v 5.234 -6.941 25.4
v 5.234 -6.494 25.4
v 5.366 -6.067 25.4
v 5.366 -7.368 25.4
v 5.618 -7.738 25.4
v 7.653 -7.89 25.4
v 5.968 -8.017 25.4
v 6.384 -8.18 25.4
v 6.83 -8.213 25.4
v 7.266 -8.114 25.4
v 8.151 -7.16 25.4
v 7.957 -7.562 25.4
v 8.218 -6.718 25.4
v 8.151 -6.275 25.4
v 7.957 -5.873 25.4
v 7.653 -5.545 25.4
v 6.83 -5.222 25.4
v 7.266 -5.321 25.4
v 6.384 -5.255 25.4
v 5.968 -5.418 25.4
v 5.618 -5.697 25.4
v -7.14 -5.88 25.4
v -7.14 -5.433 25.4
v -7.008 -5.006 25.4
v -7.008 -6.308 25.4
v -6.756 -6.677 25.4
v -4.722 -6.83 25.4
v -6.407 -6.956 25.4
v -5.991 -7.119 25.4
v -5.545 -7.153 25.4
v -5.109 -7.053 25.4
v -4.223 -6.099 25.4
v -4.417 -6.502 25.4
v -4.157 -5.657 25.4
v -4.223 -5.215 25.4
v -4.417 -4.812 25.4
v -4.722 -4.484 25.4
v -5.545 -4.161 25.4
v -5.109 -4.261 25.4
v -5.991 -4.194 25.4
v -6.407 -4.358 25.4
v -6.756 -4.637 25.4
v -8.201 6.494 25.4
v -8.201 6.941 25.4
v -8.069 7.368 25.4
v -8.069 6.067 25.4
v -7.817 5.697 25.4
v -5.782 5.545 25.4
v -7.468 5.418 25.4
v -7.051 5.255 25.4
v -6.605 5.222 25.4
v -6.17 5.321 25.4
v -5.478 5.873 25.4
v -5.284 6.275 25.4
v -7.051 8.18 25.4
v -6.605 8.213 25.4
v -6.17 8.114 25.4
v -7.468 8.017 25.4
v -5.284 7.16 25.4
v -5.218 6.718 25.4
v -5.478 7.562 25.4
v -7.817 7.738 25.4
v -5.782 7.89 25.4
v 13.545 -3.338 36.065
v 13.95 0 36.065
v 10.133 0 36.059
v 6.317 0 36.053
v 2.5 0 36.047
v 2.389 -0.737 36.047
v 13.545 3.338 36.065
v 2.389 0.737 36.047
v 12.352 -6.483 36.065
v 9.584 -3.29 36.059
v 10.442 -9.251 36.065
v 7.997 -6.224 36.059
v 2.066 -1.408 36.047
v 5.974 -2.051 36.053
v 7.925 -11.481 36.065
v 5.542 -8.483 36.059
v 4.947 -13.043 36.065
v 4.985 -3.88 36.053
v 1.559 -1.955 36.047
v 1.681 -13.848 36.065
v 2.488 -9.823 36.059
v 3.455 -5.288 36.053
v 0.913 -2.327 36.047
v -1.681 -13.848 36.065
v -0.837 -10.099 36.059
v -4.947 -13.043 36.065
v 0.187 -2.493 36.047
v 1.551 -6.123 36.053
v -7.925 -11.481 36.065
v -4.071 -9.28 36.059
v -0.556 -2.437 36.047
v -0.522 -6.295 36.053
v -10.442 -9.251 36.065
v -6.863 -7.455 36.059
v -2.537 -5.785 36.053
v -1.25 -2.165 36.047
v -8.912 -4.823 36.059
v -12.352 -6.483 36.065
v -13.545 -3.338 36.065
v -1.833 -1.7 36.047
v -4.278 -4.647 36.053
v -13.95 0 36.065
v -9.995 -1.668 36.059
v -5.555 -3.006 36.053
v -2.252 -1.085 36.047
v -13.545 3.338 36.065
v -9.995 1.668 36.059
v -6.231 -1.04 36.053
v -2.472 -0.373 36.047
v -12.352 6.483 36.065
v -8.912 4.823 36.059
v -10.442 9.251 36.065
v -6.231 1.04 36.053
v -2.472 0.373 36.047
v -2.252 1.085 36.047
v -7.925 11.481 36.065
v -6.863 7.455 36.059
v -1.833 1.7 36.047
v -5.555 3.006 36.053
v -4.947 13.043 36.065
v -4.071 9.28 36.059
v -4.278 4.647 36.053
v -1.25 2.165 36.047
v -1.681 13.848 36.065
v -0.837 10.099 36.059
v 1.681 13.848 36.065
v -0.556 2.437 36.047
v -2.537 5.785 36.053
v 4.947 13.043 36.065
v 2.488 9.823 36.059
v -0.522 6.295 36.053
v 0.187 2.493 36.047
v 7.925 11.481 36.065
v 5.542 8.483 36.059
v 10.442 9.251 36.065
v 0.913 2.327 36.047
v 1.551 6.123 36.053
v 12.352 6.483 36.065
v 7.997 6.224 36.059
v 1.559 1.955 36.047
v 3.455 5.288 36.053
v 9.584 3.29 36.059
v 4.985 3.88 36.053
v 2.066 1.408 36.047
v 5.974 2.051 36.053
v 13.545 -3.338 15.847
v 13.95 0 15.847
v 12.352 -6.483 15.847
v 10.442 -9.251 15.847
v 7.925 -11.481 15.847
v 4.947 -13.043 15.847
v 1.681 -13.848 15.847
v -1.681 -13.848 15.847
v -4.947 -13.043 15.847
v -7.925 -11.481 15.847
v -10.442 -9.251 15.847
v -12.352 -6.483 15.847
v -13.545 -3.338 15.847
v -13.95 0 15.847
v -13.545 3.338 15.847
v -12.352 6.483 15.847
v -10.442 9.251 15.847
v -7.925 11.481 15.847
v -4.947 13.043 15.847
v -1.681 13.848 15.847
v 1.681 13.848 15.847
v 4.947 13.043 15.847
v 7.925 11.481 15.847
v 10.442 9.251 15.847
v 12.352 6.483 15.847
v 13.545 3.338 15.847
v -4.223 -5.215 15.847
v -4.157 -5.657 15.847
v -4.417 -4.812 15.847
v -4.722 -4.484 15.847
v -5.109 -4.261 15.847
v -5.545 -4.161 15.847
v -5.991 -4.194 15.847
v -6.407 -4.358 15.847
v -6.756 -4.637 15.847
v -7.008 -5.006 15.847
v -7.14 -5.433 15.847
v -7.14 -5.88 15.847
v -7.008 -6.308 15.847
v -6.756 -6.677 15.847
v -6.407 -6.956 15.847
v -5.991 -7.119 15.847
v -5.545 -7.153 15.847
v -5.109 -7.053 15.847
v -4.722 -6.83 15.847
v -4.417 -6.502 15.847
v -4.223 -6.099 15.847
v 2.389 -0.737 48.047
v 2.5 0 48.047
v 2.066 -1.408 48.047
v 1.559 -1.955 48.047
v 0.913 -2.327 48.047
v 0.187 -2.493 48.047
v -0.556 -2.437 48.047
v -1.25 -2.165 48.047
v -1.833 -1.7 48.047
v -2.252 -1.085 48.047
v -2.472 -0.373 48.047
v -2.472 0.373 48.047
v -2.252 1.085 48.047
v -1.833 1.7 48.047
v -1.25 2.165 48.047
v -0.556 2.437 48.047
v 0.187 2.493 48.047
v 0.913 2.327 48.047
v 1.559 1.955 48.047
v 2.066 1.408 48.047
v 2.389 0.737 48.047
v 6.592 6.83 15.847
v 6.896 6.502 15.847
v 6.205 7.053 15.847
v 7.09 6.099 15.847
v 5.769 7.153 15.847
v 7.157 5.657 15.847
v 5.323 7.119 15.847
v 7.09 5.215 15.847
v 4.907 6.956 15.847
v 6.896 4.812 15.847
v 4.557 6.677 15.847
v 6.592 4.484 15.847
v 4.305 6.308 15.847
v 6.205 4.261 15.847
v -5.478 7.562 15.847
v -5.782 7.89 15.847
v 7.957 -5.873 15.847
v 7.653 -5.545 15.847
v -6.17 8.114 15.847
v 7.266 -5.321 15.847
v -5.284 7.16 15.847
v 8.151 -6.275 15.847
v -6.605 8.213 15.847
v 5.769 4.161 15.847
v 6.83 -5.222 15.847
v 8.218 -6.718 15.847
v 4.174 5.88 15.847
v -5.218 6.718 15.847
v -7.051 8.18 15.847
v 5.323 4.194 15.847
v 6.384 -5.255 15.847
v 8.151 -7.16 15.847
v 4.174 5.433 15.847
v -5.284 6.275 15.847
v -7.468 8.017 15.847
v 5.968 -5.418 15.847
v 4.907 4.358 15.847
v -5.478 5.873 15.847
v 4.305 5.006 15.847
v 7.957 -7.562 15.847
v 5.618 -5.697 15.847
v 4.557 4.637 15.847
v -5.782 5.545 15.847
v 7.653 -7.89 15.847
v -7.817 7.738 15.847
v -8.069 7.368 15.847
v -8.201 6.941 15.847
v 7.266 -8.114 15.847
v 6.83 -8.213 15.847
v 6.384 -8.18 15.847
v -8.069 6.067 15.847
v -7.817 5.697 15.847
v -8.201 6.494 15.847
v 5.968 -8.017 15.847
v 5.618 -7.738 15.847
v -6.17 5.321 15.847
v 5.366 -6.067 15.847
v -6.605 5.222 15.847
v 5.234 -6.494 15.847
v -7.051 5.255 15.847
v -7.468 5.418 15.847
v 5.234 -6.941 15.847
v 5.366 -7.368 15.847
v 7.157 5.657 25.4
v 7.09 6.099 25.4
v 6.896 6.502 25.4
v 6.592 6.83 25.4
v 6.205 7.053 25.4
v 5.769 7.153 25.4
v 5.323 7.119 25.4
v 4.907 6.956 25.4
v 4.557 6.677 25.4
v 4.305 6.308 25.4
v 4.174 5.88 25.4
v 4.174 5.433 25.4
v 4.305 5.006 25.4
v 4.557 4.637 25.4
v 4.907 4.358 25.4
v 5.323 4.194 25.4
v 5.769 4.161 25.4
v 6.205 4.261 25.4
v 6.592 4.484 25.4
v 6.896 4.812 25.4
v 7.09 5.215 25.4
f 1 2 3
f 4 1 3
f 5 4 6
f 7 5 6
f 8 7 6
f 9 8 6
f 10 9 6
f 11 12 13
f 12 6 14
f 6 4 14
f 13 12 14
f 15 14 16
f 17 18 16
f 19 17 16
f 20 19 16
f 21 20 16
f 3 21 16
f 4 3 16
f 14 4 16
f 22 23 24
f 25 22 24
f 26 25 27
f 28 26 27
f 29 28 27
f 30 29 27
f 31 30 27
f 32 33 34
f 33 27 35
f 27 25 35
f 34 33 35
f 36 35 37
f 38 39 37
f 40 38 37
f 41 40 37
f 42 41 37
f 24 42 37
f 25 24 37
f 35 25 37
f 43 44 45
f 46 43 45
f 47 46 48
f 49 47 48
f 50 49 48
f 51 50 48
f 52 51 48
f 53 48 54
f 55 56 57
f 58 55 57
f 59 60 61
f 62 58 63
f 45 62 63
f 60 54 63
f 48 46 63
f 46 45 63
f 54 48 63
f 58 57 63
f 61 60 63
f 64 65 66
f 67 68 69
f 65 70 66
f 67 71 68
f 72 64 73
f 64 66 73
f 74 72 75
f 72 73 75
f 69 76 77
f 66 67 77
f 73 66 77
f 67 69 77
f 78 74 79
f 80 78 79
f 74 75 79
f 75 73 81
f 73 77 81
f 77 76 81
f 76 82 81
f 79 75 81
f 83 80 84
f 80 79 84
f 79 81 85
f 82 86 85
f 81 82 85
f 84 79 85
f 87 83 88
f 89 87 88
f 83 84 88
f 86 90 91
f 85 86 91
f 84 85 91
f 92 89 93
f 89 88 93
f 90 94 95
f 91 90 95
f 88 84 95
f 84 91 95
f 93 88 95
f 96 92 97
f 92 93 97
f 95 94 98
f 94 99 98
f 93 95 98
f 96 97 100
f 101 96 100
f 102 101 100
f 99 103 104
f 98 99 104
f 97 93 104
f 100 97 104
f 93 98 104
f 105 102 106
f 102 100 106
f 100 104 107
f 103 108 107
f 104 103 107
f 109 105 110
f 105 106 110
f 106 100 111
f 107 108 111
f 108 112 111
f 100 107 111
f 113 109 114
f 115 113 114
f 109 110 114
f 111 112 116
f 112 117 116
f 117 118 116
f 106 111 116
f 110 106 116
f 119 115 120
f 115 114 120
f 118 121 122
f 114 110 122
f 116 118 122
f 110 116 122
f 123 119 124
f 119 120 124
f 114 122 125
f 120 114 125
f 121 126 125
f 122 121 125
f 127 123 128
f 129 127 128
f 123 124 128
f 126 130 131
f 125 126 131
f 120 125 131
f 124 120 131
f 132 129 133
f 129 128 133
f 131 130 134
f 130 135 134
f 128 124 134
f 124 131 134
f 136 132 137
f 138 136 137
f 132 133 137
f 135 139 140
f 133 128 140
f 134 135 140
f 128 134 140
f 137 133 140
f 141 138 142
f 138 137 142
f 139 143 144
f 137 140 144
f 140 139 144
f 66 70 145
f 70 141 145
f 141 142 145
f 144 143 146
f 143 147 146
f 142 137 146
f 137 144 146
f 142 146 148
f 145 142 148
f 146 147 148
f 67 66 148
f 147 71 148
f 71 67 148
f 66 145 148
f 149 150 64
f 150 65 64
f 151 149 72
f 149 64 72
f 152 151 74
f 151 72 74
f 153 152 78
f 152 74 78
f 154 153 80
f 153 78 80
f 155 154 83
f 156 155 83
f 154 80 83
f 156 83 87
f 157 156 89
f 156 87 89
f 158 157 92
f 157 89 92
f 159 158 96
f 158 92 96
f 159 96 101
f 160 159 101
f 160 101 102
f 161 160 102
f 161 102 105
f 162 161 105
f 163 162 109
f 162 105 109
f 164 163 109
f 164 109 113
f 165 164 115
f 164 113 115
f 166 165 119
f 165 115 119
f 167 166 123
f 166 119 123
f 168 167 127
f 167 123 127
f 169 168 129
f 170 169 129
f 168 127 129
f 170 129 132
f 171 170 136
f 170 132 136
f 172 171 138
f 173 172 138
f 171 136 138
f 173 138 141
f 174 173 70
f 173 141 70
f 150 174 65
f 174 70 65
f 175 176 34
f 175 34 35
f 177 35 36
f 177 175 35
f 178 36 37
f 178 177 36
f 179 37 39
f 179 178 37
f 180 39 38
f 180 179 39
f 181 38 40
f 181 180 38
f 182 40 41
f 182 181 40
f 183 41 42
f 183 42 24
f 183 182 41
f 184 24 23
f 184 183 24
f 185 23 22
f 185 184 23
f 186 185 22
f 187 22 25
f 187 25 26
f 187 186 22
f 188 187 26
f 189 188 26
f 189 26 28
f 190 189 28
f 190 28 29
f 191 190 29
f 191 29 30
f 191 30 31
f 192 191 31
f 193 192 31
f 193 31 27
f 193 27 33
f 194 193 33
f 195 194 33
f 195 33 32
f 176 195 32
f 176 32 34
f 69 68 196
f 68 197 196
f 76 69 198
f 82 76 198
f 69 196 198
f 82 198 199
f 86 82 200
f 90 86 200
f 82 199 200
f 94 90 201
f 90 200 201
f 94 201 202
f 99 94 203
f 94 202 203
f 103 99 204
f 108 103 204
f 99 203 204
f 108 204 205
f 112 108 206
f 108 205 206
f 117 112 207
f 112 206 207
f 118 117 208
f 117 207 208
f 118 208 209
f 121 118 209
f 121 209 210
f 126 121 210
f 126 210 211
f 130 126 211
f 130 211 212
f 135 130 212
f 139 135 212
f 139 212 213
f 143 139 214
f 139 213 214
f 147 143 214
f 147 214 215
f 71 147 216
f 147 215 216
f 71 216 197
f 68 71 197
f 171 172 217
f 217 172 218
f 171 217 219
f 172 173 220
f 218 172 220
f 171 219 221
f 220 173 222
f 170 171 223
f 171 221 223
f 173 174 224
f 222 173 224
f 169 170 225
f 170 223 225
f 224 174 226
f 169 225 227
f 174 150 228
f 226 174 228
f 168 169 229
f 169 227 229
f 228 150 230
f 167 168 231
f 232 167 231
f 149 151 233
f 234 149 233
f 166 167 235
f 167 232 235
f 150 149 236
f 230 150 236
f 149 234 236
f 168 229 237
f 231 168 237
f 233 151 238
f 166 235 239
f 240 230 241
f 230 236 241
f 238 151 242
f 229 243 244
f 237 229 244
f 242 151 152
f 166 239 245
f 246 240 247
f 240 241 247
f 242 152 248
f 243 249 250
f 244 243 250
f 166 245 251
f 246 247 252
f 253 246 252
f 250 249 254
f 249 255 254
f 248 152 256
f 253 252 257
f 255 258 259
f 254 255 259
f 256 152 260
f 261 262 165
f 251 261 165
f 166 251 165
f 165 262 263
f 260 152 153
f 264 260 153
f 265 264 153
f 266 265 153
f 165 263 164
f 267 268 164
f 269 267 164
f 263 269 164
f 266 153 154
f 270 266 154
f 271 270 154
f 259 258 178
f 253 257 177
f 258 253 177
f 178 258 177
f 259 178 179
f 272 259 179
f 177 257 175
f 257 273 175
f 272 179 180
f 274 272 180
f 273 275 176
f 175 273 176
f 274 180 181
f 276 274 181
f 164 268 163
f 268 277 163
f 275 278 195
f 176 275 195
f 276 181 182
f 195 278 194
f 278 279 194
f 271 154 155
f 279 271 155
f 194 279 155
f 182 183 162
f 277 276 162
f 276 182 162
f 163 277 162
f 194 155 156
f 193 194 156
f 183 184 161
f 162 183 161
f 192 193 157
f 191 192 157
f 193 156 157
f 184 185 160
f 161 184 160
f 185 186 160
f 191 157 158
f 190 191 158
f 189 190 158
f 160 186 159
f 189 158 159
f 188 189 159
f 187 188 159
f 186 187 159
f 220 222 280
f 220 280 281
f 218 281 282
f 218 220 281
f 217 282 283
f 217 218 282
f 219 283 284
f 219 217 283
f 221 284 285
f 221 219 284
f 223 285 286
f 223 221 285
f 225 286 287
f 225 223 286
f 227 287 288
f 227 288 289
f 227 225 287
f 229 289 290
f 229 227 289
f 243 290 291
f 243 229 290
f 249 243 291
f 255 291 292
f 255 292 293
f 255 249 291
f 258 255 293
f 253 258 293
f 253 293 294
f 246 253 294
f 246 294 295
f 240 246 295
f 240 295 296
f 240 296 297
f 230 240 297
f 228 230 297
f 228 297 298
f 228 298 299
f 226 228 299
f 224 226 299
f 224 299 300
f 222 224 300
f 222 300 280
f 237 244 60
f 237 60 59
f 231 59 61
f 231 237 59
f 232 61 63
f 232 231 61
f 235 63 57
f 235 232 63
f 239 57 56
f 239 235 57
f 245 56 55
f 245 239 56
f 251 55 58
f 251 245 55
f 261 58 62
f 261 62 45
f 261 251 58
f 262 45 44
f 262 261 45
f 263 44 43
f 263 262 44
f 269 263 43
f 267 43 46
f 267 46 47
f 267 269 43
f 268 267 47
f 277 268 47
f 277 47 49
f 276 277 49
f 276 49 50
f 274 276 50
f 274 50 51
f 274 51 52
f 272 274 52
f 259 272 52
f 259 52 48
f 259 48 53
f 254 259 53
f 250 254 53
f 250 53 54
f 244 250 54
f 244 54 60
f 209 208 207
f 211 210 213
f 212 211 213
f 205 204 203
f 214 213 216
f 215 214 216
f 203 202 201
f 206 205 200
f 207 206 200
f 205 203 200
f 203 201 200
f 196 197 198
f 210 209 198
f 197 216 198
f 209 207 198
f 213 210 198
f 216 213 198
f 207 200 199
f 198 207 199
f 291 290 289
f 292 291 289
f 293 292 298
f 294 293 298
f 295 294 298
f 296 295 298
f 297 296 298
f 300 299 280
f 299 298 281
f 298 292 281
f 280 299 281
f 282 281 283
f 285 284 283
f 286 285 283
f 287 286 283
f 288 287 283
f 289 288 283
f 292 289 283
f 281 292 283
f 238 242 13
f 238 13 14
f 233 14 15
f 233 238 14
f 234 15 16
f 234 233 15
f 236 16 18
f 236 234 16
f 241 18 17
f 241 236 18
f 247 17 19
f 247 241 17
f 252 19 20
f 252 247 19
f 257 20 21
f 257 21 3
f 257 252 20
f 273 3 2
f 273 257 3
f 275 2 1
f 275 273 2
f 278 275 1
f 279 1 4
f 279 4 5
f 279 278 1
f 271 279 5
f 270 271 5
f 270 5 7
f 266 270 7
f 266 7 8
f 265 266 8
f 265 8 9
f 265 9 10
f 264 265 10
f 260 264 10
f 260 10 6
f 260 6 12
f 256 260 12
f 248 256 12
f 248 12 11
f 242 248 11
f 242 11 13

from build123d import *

# Parameters (mm, degrees)
F2_R     = 1.5
F4_DEPTH = 25.4
F3_R     = 1.5
F5_DEPTH = 25.4


with BuildPart() as f1:
    # F0 (on Front) → F1 (revolve)
    with BuildSketch(Plane.XZ):
        Polygon((0, 48.046581), (0, 15.846581), (13.95, 15.846581), (13.95, 36.064981), (2.5, 36.046581), (2.5, 48.046581), align=None)
    revolve(axis=Axis((0, 0, 31.946581), (0, 0, -1)))

    # F2 (on Top) → F4 (cut)
    with BuildSketch(Plane.XY):
        with Locations((6.717514, -6.717514)):
            Circle(F2_R)
        with Locations((-6.717514, 6.717514)):
            Circle(F2_R)
    extrude(amount=F4_DEPTH, mode=Mode.SUBTRACT)

    # F3 (on Top) → F5 (cut)
    with BuildSketch(Plane.XY):
        with Locations((-5.656854, -5.656854)):
            Circle(F3_R)
        with Locations((5.656854, 5.656854)):
            Circle(F3_R)
    extrude(amount=F5_DEPTH, mode=Mode.SUBTRACT)


solid = f1.part
